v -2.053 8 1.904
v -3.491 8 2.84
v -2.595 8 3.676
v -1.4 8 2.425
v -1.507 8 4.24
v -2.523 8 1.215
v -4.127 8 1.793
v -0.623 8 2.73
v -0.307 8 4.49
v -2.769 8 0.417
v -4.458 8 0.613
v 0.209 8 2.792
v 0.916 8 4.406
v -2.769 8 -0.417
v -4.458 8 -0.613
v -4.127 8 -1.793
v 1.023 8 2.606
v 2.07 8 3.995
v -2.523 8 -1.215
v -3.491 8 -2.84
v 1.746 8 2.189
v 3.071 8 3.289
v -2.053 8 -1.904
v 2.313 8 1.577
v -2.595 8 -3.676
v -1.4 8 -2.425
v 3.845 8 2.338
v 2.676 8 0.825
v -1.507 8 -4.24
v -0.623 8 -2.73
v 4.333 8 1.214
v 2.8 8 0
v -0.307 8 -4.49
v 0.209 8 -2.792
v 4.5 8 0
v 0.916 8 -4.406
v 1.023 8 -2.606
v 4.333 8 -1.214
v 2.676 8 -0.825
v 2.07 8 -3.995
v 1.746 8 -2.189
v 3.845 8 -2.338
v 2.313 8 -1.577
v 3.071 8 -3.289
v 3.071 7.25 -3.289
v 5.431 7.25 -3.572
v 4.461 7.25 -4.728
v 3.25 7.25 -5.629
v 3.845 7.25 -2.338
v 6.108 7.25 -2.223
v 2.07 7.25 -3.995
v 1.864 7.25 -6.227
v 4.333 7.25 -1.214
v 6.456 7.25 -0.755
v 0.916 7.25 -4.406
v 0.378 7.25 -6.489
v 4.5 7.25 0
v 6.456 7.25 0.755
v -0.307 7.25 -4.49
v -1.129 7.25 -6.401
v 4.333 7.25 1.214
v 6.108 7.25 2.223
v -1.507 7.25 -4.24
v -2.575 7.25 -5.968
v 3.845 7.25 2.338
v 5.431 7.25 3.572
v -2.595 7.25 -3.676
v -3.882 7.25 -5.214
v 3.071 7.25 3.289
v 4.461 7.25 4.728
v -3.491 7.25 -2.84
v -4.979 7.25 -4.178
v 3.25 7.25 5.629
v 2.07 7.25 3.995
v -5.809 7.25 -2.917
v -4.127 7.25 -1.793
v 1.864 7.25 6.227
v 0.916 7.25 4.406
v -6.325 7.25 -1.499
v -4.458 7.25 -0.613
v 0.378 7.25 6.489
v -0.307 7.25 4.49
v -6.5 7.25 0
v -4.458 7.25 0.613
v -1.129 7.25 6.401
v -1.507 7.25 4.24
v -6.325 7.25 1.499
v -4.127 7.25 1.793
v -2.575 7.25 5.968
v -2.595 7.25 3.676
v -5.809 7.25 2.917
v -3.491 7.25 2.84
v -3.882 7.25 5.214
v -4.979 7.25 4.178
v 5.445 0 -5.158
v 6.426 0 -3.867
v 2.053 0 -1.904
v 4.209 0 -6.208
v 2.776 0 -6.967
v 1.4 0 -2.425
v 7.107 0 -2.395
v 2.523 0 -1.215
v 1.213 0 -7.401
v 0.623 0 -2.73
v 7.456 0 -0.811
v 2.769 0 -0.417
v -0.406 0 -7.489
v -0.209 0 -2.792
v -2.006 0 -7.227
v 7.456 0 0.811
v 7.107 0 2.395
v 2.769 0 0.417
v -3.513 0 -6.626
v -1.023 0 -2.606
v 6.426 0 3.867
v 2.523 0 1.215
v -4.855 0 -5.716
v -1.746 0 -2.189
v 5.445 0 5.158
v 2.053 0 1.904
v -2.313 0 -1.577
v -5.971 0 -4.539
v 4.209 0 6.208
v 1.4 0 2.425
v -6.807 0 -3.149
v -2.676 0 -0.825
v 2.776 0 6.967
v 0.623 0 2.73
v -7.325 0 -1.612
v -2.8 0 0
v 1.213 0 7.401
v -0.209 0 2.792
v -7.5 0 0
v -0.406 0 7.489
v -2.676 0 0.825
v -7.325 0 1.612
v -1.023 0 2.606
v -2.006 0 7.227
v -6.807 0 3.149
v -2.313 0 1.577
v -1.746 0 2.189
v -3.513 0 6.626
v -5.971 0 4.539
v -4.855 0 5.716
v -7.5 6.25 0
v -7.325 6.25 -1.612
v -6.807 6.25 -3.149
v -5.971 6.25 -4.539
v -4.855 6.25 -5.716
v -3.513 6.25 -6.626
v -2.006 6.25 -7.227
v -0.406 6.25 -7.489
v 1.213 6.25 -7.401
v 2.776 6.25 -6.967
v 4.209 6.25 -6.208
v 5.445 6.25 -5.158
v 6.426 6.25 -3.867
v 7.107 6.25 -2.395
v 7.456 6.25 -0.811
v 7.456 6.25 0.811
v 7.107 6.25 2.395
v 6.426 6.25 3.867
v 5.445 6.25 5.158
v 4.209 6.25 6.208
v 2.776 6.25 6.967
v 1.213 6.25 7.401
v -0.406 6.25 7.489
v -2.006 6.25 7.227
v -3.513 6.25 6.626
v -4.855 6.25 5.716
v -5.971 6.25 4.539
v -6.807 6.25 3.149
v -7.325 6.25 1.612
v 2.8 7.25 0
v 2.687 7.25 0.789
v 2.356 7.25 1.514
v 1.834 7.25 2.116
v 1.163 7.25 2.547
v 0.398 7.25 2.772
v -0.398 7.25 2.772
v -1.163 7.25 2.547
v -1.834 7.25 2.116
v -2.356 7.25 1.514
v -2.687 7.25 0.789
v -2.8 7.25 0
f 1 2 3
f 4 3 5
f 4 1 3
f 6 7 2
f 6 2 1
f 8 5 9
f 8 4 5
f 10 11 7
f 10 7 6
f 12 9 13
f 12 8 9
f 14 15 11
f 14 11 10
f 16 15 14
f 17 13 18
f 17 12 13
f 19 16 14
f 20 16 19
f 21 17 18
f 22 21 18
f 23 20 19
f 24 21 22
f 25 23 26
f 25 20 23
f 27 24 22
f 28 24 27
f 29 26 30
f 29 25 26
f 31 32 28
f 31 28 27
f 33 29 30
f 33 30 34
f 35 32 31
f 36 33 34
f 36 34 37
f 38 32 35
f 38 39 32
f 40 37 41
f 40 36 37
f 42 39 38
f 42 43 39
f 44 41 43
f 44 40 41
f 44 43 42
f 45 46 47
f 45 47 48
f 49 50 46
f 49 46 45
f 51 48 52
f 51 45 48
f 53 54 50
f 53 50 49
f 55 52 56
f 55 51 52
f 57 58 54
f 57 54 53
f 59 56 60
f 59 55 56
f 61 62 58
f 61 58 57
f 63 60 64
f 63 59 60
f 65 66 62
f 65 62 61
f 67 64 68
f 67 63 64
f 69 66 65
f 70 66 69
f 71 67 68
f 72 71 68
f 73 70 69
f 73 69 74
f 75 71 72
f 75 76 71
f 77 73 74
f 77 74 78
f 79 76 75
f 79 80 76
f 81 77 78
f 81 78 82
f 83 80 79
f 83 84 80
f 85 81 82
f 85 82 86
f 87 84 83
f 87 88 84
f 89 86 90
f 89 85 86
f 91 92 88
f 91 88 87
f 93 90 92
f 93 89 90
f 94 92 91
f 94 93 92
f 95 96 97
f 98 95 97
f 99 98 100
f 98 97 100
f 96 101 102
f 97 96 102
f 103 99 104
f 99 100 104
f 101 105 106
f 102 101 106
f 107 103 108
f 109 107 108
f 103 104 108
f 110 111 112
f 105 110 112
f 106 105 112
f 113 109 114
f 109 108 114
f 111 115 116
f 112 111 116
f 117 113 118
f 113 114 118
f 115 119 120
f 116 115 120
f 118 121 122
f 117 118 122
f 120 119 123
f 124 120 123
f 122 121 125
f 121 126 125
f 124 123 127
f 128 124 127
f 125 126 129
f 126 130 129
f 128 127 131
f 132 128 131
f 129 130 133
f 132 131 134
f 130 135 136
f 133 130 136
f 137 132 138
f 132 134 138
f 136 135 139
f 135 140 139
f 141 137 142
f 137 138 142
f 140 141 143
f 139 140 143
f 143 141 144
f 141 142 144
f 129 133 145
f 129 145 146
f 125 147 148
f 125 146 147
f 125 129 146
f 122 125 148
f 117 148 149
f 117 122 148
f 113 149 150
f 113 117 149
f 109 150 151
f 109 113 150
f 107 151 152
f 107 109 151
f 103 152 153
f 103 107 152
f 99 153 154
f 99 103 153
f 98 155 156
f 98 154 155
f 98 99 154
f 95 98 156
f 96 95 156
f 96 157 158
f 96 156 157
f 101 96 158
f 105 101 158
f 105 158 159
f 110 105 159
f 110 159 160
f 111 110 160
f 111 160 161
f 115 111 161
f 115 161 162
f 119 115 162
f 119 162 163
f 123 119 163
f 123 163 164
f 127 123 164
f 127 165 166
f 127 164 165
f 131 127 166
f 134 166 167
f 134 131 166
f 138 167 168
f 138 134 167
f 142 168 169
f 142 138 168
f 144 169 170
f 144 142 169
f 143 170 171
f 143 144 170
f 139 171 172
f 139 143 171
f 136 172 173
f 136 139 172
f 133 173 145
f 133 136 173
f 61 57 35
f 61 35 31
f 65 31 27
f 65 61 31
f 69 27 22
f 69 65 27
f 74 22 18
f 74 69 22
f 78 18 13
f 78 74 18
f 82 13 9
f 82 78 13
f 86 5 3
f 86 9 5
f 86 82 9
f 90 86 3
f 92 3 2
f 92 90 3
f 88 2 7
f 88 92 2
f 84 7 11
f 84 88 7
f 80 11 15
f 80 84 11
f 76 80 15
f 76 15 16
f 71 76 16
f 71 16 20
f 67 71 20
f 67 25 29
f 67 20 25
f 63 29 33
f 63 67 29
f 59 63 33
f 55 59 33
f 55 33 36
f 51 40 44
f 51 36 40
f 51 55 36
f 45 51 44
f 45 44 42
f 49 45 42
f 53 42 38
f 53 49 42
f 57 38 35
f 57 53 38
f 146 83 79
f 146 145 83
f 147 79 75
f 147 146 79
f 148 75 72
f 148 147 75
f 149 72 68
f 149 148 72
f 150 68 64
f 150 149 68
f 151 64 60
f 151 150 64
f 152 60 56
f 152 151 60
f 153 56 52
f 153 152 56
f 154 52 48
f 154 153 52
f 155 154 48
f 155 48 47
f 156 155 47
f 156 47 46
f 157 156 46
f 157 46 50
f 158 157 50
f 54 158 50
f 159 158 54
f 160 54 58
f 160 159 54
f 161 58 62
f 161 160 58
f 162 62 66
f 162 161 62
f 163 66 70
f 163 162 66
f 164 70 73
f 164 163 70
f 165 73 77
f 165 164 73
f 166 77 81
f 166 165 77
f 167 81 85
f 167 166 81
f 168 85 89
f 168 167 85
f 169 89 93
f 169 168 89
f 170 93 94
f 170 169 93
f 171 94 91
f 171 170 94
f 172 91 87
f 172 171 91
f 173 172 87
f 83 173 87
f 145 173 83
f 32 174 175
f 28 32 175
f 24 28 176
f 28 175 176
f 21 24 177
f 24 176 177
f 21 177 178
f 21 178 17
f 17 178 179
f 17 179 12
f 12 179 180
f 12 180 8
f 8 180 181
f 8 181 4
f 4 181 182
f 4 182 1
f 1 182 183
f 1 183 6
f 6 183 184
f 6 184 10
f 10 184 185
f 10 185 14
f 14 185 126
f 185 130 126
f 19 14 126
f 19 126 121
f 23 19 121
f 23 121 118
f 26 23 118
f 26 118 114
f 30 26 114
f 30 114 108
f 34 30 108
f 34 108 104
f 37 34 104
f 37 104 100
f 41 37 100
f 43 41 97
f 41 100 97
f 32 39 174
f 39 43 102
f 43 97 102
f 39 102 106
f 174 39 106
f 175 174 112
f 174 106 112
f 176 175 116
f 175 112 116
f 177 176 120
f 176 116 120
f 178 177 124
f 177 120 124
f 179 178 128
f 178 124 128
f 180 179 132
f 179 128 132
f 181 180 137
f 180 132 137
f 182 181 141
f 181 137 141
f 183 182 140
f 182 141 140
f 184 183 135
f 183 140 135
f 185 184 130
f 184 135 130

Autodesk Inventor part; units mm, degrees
ref_plane "YZ Plane" through (0, 0, 0) normal (1, 0, 0) x (0, 1, 0)
ref_plane "XZ Plane" through (0, 0, 0) normal (0, 1, 0) x (-1, 0, 0)
ref_plane "XY Plane" through (0, 0, 0) normal (0, 0, 1) x (1, 0, 0)
sketch "Sketch1" plane through (0, 0, 0) normal (0, 1, 0) x (-1, 0, 0)
  circle A0 centre (0, 0) radius 2.8
  circle A1 centre (0, 0) radius 7.5
  dimension "d0" = 5.6
  dimension "d1" = 15
extrude "Extrusion1" add sketch "Sketch1" along normal blind 7.25
sketch "Sketch2" plane through (0, 7.25, 0) normal (0, 1, 0) x (1, 0, 0)
  circle A0 centre (0, 0) radius 4.5
  circle A1 centre (0, 0) radius 2.8 projected
  dimension "d4" = 9
extrude "Extrusion2" add sketch "Sketch2" along normal blind 0.75
chamfer "Chamfer1" distance 1 angle 45 1 edges at (7.5, 7.25, 0)
properties part number "Y-Carraige_Spacer_LM3044" material "ABS Plastic"
